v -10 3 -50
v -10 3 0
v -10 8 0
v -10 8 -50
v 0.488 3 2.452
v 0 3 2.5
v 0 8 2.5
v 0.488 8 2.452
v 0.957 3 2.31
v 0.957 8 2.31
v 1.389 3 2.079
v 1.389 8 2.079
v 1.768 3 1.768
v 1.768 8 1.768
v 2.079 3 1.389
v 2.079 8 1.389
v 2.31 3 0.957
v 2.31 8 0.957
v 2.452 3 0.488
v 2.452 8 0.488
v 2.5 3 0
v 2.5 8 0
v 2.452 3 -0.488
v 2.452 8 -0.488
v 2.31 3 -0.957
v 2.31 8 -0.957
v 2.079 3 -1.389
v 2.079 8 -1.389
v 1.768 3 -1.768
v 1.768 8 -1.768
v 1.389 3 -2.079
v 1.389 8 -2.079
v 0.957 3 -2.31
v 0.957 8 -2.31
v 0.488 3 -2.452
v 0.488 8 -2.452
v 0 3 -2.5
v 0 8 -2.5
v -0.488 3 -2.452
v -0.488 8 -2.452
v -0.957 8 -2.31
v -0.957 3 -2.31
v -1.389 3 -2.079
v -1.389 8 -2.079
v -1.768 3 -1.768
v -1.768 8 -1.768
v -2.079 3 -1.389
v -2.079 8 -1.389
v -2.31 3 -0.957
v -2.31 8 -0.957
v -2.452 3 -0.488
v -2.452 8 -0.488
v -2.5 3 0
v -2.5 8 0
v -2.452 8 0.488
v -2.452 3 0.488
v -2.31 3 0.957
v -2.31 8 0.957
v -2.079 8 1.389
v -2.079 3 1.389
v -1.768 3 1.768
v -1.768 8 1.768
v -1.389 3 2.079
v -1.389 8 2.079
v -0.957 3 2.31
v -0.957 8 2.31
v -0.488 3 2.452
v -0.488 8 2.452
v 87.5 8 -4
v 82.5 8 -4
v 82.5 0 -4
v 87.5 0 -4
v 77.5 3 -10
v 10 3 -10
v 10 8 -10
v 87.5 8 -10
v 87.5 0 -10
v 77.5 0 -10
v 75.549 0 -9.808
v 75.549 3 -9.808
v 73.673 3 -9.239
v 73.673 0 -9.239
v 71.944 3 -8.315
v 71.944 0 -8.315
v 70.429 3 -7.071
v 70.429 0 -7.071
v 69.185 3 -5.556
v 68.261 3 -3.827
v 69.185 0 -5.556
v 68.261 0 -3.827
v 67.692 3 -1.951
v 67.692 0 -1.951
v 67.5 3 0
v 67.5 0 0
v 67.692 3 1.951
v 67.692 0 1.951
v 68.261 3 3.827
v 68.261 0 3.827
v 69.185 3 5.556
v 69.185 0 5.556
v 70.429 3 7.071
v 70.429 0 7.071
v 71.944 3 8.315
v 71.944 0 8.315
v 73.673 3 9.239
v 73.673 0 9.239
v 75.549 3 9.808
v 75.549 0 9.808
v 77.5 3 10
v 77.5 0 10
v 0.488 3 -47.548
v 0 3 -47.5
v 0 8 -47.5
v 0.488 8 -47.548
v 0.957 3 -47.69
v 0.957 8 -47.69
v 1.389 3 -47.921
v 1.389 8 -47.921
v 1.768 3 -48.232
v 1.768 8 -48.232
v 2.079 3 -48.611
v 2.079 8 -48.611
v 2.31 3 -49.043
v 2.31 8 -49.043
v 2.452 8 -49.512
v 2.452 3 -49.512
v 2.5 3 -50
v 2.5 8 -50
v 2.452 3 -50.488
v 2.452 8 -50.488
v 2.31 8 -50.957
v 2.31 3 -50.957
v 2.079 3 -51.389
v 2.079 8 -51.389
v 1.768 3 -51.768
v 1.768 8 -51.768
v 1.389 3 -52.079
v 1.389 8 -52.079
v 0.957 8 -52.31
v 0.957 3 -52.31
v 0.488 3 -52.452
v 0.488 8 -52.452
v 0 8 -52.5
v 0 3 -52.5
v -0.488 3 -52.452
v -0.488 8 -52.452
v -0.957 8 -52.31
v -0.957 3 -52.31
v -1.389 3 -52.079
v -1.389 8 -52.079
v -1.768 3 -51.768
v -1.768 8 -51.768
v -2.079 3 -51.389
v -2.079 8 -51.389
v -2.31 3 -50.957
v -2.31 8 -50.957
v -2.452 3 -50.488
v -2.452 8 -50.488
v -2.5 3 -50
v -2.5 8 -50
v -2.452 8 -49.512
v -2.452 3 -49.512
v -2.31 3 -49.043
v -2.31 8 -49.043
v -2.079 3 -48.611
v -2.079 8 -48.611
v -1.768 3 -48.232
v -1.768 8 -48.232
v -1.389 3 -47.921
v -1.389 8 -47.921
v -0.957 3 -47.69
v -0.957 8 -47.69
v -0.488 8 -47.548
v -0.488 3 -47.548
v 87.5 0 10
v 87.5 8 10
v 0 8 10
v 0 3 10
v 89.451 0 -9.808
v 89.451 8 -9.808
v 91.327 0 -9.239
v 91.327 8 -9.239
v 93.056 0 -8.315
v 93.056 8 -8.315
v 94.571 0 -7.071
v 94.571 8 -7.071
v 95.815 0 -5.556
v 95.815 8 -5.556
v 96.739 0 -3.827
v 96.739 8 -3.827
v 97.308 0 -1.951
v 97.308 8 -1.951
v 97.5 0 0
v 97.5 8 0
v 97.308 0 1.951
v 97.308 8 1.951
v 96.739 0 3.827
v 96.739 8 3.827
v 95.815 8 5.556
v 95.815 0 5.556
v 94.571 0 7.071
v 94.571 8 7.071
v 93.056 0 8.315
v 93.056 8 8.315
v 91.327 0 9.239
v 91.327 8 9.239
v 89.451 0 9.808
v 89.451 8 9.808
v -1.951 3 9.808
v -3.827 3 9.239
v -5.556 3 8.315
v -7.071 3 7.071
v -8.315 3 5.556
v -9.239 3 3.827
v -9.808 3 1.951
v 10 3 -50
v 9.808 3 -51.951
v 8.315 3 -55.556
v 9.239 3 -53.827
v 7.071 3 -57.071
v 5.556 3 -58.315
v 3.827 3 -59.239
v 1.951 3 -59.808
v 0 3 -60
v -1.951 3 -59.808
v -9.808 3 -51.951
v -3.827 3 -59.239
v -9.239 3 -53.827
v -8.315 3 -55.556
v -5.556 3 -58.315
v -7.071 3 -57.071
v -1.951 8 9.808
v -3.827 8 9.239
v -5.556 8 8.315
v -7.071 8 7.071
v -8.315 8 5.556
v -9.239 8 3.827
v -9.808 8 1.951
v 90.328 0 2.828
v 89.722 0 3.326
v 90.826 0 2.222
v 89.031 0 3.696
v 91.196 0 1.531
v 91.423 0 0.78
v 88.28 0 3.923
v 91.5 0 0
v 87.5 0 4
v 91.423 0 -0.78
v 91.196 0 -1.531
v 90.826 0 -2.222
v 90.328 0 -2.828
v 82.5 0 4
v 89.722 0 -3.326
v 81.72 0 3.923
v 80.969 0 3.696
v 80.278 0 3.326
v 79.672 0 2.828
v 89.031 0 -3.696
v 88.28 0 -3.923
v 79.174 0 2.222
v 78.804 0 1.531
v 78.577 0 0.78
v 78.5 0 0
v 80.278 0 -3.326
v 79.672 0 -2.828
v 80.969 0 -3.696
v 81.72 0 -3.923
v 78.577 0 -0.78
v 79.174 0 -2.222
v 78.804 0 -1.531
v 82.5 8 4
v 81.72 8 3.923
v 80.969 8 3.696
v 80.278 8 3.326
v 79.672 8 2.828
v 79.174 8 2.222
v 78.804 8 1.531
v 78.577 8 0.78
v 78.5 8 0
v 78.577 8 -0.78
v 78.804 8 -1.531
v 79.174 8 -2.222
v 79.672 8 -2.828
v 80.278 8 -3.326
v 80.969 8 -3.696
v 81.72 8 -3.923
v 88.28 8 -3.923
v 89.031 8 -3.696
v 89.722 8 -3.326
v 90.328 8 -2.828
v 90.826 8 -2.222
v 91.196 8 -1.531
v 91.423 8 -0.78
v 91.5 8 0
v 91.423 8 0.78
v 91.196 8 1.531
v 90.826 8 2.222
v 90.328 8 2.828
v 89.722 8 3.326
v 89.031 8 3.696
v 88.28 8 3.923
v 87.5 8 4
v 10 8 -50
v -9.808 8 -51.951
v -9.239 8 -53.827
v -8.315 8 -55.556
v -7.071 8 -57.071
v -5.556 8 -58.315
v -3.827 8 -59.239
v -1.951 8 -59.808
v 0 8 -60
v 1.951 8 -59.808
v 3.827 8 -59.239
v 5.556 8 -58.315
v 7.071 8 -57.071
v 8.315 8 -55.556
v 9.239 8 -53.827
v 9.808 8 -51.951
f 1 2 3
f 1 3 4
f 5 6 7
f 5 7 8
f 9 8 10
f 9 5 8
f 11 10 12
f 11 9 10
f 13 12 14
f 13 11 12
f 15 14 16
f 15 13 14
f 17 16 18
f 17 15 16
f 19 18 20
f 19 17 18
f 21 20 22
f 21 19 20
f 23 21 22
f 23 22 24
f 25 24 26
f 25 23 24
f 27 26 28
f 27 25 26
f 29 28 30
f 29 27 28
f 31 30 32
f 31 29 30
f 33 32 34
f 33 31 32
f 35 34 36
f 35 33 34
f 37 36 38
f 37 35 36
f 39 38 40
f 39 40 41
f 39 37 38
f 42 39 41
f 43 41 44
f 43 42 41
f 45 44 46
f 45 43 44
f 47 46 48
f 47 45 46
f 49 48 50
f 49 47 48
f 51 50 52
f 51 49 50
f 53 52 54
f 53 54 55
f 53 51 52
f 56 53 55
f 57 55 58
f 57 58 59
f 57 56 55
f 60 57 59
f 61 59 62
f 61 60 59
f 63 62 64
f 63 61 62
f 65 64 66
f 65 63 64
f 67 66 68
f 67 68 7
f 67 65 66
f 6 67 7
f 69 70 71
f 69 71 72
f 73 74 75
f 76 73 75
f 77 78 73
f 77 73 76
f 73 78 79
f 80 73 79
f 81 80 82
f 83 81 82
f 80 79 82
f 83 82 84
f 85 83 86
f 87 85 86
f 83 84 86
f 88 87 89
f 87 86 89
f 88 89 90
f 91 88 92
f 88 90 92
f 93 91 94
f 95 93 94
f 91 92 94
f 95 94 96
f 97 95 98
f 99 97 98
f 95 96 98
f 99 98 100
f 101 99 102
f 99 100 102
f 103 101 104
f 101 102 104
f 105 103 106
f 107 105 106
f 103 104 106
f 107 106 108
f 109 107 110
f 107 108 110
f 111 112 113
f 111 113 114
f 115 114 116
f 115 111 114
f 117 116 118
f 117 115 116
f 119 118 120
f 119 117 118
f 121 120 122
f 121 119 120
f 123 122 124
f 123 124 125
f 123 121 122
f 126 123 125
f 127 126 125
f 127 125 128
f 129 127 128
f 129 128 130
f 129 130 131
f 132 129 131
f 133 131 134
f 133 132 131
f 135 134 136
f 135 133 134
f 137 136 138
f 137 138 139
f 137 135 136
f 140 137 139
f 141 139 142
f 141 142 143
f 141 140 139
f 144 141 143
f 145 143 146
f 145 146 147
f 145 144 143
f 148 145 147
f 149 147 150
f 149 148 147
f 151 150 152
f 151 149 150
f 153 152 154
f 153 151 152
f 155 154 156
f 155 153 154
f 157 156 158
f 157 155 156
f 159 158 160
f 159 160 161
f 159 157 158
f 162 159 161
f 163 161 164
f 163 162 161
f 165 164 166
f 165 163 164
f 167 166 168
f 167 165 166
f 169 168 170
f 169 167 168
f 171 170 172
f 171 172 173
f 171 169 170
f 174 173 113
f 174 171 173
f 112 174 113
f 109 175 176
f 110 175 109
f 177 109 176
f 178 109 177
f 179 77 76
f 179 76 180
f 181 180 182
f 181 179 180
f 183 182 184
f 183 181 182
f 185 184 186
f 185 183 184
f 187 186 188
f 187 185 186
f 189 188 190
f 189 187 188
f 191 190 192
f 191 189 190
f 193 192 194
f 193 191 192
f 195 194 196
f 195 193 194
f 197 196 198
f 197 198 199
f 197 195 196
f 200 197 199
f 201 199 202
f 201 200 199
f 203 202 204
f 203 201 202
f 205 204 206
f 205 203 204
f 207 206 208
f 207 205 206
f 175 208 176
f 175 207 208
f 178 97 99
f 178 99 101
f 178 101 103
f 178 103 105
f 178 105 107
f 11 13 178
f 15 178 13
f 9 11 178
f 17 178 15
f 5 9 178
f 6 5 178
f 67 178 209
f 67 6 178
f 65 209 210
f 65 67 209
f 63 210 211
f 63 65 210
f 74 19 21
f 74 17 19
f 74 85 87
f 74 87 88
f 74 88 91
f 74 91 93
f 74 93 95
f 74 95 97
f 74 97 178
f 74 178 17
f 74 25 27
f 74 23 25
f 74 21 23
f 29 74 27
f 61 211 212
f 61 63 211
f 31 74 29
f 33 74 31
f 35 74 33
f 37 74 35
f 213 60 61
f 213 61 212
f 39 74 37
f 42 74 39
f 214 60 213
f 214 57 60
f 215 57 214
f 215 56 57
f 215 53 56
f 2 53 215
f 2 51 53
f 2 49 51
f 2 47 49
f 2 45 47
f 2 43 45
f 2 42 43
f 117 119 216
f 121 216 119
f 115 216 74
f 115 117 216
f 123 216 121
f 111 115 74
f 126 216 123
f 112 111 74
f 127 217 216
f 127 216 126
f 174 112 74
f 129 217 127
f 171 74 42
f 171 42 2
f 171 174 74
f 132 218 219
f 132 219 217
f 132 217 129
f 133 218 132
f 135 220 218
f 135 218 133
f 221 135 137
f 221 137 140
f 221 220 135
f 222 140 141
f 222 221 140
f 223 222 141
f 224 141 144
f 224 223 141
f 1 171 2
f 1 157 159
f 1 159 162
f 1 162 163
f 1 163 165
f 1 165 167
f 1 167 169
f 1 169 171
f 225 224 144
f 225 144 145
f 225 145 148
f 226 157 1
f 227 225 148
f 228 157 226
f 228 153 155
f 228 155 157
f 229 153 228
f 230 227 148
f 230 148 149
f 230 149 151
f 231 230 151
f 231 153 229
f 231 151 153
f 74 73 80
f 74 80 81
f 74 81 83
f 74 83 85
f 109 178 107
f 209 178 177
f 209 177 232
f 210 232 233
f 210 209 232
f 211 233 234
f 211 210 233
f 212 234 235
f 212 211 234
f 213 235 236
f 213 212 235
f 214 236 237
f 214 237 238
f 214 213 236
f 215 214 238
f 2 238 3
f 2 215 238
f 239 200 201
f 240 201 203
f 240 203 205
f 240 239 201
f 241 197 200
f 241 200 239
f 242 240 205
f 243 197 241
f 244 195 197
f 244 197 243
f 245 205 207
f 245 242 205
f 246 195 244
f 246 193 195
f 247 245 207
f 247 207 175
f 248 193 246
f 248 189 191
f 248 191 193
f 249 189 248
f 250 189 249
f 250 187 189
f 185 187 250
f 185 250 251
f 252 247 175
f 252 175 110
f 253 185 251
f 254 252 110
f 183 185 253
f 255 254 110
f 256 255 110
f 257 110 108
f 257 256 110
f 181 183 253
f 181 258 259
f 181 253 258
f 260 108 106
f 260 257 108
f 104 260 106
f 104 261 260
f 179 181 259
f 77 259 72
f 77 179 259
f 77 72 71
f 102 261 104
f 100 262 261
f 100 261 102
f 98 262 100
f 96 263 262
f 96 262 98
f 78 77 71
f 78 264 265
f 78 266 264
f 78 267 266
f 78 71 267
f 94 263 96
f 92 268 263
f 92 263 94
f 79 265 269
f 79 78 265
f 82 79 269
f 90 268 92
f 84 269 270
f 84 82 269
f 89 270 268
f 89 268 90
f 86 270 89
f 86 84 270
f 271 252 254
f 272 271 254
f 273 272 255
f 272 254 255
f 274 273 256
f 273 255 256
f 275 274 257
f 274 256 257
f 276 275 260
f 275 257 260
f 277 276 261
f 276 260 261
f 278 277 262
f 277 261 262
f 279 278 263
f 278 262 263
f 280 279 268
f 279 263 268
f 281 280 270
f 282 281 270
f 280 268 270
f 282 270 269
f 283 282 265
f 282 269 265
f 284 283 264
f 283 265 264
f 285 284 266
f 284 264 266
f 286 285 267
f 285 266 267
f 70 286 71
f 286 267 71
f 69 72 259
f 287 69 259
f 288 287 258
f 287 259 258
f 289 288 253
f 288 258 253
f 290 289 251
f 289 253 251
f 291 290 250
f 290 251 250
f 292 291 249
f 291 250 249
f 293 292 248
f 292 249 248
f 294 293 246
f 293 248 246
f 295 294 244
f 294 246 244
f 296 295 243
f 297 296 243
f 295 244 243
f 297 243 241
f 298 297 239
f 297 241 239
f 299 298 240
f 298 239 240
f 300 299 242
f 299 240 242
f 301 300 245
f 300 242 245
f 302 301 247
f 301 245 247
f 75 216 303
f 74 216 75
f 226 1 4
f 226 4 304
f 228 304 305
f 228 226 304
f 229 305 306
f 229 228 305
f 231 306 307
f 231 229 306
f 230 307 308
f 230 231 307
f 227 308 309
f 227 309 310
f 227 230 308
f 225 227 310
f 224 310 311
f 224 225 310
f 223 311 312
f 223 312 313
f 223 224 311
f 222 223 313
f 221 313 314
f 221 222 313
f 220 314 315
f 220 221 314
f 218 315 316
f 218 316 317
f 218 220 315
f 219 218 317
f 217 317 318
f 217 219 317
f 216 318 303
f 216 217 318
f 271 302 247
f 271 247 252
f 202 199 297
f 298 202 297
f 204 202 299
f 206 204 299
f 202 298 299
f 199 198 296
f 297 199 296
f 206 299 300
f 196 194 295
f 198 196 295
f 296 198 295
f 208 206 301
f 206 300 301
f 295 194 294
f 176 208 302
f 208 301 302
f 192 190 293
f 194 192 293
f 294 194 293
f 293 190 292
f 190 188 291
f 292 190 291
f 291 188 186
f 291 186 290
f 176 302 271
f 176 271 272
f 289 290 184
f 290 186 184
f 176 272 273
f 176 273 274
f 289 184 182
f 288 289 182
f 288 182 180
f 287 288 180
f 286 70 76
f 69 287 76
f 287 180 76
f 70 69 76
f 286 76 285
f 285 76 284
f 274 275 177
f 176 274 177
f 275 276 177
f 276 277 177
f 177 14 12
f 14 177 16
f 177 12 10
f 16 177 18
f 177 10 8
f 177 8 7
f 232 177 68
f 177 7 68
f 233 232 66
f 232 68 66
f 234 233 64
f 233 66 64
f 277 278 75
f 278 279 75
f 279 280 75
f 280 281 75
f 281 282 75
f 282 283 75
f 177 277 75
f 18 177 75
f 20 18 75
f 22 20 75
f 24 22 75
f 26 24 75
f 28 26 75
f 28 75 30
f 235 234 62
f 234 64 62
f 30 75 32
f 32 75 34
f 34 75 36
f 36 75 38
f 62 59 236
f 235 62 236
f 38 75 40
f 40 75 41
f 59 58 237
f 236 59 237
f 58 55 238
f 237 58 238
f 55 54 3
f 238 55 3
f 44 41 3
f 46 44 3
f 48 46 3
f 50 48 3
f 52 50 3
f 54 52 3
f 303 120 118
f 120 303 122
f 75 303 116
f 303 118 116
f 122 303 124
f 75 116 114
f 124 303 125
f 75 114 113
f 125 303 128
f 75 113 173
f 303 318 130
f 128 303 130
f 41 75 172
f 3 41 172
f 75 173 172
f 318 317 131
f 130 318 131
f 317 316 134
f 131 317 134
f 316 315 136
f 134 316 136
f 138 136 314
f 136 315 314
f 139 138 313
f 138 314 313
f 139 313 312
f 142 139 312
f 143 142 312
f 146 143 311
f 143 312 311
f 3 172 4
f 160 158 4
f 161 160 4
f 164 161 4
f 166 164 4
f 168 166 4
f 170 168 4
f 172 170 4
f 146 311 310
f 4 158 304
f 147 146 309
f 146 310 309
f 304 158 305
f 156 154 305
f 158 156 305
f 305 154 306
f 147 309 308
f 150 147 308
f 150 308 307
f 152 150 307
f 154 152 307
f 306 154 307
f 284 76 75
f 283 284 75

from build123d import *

# Parameters (mm, degrees)
SKETCH1_R           = 2.5
BOSS_EXTRUDE1_DEPTH = 8
BOSS_EXTRUDE2_START = -5
SKETCH2_R           = 2.5
BOSS_EXTRUDE2_DEPTH = 5
SKETCH3_OUTSIDE_W   = 135.206
SKETCH3_OUTSIDE_H   = 97.706
CUT_EXTRUDE2_DEPTH  = 3


with BuildPart() as part:
    # Sketch1 → Boss-Extrude1 (new body)
    with BuildSketch(Plane(origin=(0, 0, 0), x_dir=(1, 0, 0), z_dir=(0, 1, 0))):
        with BuildLine():
            Line((0, 10), (87.5, 10))
            ThreePointArc((87.5, 10), (97.5, 0), (87.5, -10))
            Line((87.5, -10), (0, -10))
            ThreePointArc((0, -10), (-10, 0), (0, 10))
        make_face()
        with Locations(Location((0, 0, 0), (0, 0, 270))):
            Circle(SKETCH1_R, mode=Mode.SUBTRACT)
        with BuildLine():
            Line((87.5, -4), (82.5, -4))
            ThreePointArc((82.5, -4), (78.5, 0), (82.5, 4))
            Line((82.5, 4), (87.5, 4))
            ThreePointArc((87.5, 4), (91.5, 0), (87.5, -4))
        make_face(mode=Mode.SUBTRACT)
    extrude(amount=BOSS_EXTRUDE1_DEPTH)

    # Sketch2 → Boss-Extrude2 (add)
    with BuildSketch(Plane(origin=(0, 8, 0), x_dir=(1, 0, 0), z_dir=(0, 1, 0)).offset(BOSS_EXTRUDE2_START)):
        with BuildLine():
            Line((-10, 0), (-10, 50))
            ThreePointArc((-10, 50), (0, 60), (10, 50))
            Line((10, 50), (10, 0))
            ThreePointArc((10, 0), (0, -10), (-10, 0))
        make_face()
        with Locations(Location((0, 0, 0), (0, 0, 270))):
            Circle(SKETCH2_R, mode=Mode.SUBTRACT)
        with Locations(Location((0, 50, 0), (0, 0, 270))):
            Circle(SKETCH2_R, mode=Mode.SUBTRACT)
    extrude(amount=BOSS_EXTRUDE2_DEPTH)

    # Sketch3 outside → Cut-Extrude2 (cut)
    with BuildSketch(Plane.XZ):
        with Locations((43.75, -25)):
            Rectangle(SKETCH3_OUTSIDE_W, SKETCH3_OUTSIDE_H)
        with BuildLine():
            Line((87.5, -10), (77.5, -10))
            ThreePointArc((77.5, -10), (67.5, 0), (77.5, 10))
            Line((77.5, 10), (87.5, 10))
            ThreePointArc((87.5, 10), (97.5, 0), (87.5, -10))
        make_face(mode=Mode.SUBTRACT)
    extrude(amount=-CUT_EXTRUDE2_DEPTH, mode=Mode.SUBTRACT)


solid = part.part
